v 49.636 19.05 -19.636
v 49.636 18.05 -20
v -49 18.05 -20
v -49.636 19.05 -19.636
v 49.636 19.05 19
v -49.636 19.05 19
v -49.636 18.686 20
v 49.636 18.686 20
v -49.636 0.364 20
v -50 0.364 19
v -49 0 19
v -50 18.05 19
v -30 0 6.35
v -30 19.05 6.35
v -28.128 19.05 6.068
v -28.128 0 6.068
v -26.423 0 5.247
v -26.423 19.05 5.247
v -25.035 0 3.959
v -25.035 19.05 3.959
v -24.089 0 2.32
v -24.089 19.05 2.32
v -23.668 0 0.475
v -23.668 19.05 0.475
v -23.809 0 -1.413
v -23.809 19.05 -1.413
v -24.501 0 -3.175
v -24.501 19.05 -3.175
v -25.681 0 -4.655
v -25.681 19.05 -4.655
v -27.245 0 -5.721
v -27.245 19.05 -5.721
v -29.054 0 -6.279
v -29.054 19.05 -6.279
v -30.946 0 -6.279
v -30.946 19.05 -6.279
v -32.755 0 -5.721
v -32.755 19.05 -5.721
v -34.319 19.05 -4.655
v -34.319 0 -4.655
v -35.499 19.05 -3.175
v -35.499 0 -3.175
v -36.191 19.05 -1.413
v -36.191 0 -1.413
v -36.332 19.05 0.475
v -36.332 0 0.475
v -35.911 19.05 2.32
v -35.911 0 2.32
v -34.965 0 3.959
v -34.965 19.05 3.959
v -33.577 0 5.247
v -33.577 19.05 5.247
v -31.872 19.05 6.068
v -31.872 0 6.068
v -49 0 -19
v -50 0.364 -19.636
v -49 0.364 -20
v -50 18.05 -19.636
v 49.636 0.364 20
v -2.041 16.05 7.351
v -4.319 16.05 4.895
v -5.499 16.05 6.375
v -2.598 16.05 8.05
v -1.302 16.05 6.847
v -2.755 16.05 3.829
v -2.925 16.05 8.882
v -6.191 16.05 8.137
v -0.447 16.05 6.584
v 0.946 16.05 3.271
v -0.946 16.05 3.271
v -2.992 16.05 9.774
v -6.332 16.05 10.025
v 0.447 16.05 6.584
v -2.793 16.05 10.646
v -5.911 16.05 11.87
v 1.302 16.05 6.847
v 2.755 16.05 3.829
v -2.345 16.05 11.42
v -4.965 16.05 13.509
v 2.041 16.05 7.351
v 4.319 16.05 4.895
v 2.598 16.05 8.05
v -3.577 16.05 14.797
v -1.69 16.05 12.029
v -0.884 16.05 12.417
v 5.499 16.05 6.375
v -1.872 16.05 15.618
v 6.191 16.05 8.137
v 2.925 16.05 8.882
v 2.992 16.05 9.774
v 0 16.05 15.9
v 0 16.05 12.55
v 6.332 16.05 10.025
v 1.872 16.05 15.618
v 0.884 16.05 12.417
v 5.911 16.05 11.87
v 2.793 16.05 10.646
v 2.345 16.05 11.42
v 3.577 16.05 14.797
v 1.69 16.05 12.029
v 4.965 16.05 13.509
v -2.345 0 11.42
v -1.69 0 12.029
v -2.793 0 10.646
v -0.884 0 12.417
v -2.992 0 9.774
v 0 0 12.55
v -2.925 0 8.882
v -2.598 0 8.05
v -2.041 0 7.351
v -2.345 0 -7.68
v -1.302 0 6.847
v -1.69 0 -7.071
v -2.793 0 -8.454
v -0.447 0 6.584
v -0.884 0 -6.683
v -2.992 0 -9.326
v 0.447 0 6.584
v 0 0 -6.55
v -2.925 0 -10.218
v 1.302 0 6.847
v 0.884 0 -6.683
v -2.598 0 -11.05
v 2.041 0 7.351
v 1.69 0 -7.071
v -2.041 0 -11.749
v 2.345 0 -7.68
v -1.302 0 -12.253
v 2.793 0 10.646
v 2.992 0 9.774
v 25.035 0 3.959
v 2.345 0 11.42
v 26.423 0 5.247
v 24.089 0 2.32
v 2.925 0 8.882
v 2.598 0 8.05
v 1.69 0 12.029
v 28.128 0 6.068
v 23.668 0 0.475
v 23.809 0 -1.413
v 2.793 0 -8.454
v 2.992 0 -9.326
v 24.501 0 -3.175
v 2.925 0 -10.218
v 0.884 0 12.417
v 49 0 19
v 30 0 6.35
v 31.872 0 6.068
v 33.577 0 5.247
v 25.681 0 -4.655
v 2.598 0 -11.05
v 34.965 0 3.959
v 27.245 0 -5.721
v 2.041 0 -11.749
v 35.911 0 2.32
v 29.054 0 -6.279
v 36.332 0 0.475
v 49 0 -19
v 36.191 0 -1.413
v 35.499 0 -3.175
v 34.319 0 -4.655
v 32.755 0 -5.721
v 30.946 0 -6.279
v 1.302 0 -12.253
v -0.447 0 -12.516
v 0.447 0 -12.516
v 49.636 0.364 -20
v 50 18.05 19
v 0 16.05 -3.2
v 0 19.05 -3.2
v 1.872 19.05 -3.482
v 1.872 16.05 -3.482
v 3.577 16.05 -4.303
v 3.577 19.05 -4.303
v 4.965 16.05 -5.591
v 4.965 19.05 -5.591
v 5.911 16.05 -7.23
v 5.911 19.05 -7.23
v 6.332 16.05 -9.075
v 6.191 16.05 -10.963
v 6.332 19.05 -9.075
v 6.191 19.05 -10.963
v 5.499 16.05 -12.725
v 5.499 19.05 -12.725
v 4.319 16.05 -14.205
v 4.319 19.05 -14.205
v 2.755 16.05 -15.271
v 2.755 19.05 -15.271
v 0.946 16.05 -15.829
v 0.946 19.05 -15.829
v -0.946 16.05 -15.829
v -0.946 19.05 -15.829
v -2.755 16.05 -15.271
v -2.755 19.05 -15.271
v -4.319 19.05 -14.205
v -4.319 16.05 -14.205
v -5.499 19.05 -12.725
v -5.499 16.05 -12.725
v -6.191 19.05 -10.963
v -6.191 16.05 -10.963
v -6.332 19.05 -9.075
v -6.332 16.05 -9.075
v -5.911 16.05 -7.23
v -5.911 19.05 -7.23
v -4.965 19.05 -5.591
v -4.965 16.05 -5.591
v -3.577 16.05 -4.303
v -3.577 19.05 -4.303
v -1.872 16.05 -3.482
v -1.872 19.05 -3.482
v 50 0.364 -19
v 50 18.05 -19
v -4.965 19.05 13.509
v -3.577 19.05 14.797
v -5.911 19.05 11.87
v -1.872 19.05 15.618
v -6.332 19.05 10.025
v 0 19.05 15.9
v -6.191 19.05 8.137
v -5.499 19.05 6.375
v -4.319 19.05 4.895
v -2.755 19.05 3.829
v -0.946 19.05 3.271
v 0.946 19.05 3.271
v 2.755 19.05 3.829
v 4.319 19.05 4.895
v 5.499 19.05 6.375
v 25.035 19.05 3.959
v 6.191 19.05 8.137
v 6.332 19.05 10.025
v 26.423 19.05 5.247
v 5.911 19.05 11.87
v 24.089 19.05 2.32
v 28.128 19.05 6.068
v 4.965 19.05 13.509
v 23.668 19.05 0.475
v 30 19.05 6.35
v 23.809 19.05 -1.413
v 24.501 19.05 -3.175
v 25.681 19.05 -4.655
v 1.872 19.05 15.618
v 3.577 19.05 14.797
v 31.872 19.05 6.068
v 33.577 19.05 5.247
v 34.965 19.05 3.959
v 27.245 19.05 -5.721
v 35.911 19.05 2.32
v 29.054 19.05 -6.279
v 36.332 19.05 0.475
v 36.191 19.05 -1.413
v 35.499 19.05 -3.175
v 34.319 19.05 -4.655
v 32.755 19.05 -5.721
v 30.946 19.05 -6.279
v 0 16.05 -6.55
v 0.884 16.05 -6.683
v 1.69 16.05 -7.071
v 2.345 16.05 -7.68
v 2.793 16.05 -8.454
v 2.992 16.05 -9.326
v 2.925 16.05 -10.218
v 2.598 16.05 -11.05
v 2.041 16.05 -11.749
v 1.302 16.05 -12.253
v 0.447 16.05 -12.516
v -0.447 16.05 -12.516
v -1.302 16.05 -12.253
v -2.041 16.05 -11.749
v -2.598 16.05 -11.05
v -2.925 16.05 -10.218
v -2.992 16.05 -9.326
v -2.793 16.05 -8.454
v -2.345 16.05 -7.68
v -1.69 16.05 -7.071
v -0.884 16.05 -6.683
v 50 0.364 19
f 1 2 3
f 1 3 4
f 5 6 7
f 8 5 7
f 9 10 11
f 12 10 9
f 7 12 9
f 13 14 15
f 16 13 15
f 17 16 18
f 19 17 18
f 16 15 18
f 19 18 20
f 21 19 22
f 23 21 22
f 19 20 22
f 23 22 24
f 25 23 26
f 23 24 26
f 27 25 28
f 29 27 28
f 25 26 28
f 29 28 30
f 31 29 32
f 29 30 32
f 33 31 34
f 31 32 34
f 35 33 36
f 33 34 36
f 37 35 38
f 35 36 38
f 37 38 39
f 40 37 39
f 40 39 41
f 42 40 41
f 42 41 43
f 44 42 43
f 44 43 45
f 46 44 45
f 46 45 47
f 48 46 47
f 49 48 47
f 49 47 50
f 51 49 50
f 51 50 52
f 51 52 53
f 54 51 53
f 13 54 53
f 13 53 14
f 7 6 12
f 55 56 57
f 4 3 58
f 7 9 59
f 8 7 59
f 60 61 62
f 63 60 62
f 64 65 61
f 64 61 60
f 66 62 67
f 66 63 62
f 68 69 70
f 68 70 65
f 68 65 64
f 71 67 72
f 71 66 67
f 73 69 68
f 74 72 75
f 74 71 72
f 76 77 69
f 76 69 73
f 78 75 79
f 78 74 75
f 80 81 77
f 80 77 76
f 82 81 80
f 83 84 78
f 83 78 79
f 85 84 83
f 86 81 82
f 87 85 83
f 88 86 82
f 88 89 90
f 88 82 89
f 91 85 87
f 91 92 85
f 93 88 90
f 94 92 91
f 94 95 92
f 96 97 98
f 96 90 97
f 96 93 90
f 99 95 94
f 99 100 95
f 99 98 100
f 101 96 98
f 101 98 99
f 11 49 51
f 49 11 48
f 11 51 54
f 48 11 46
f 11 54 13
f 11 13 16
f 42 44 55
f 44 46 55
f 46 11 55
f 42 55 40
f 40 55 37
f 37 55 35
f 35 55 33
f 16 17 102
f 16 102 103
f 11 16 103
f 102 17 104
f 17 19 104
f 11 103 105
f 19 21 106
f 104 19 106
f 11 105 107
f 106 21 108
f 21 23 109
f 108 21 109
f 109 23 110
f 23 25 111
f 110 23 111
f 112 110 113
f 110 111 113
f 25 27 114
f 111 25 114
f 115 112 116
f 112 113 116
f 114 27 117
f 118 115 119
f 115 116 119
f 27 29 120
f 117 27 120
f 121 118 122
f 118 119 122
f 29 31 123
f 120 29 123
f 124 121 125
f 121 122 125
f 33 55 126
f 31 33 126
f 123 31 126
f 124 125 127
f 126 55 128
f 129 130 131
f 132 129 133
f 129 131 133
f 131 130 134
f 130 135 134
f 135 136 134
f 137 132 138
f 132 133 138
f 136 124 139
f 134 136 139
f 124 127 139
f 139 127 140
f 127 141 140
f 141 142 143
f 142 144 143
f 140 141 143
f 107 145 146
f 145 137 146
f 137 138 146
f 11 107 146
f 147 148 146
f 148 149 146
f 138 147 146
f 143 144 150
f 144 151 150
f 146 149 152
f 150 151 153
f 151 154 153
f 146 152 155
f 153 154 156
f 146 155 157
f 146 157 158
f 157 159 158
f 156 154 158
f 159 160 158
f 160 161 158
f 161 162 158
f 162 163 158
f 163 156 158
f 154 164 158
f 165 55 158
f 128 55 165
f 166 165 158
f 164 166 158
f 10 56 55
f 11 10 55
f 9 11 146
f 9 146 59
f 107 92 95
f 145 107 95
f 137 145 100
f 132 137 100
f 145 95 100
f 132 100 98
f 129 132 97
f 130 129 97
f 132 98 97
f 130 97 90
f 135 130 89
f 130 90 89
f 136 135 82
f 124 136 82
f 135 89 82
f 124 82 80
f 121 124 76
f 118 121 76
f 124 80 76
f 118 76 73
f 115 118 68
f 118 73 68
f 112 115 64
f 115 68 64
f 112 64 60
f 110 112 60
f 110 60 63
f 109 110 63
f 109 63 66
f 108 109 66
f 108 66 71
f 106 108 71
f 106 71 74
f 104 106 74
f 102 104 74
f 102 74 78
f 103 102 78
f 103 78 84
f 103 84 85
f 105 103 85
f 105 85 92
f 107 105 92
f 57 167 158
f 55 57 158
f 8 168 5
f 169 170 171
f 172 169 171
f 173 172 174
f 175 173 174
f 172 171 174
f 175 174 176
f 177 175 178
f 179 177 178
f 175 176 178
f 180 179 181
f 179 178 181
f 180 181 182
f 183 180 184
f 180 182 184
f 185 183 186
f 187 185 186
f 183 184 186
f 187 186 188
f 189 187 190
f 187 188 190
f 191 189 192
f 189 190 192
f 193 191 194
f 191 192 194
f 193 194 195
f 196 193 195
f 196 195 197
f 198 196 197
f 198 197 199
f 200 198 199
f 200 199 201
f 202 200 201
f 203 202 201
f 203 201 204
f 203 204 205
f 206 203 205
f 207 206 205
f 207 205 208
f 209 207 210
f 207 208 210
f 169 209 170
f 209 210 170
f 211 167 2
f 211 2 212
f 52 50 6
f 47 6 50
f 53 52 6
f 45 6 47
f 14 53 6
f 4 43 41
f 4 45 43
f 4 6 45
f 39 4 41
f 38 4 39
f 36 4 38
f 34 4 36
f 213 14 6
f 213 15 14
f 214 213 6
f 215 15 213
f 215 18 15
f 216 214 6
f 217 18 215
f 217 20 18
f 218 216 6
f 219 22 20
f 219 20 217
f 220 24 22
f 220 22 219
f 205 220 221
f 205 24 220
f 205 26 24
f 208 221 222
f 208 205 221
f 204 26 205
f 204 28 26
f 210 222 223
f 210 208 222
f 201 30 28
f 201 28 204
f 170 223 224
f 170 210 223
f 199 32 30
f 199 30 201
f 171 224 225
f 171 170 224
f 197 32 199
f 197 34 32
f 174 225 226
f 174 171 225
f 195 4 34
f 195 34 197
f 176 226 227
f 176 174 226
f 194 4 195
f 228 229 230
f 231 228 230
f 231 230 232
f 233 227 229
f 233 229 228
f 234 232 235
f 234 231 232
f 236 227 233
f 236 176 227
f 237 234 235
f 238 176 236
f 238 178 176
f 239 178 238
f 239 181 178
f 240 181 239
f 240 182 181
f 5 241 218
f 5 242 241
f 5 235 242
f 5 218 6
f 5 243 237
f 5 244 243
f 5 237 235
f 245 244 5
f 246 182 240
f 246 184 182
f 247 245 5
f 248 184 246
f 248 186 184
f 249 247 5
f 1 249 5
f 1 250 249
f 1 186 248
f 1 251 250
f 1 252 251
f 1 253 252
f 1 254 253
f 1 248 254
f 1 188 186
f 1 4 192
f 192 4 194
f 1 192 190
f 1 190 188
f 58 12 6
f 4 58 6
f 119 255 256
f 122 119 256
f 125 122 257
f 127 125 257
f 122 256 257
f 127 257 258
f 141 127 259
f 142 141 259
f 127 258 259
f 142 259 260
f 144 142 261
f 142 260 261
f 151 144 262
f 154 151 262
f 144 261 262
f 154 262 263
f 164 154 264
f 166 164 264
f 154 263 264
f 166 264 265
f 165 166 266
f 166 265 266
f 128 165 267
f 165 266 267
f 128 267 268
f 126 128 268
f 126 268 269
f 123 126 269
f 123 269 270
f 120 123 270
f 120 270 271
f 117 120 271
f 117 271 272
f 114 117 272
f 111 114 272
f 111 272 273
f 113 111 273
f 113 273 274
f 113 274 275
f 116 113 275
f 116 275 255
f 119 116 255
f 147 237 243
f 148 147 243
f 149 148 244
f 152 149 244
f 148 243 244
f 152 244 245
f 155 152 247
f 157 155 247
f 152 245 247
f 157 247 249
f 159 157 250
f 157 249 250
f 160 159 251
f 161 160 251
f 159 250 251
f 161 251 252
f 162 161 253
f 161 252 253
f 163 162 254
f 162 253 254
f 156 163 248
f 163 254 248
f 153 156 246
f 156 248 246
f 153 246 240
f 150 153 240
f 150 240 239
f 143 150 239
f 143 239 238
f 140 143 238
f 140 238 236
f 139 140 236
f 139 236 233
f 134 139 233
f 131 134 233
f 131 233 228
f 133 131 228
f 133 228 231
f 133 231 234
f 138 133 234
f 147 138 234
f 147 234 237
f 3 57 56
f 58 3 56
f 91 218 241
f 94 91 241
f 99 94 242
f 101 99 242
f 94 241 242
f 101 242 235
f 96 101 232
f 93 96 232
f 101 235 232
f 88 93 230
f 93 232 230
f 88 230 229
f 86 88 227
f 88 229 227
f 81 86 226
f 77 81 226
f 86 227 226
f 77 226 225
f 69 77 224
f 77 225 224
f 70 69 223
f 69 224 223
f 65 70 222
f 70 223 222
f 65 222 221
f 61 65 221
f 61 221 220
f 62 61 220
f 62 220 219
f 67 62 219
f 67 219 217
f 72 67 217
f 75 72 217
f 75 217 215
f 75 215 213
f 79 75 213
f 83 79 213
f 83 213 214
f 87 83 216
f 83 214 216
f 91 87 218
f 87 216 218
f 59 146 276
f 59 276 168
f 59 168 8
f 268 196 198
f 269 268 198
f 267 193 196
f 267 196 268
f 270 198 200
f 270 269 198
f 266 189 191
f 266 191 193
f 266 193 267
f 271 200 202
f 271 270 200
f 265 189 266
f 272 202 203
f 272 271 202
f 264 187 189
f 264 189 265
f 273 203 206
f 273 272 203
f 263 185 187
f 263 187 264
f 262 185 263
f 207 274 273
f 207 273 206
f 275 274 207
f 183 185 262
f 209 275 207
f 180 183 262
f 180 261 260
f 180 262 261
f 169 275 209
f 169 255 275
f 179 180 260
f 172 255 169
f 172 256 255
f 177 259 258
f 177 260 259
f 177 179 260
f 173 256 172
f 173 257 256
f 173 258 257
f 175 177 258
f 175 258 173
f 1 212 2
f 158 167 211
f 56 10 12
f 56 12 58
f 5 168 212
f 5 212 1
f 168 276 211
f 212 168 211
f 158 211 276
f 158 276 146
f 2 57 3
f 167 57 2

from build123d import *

# Parameters (mm, degrees)
SKETCH3_W           = 100
SKETCH3_H           = 40
BOSS_EXTRUDE1_DEPTH = 19.05
SKETCH4_R           = 3
SKETCH4_R_2         = 6.35
CUT_EXTRUDE1_DEPTH  = 58.121821575
SKETCH5_R           = 6.35
CUT_EXTRUDE2_DEPTH  = 3


with BuildPart() as part:
    # Sketch3 → Boss-Extrude1 (new body)
    with BuildSketch(Plane(origin=(0, 0, 0), x_dir=(1, 0, 0), z_dir=(0, 1, 0))):
        Rectangle(SKETCH3_W, SKETCH3_H)
    extrude(amount=BOSS_EXTRUDE1_DEPTH)

    # Sketch4 → Cut-Extrude1 (cut, through all)
    with BuildSketch(Plane(origin=(0, 19.05, 0), x_dir=(1, 0, 0), z_dir=(0, 1, 0))):
        with Locations(Location((0, 9.55, 0), (0, 0, 270))):
            Circle(SKETCH4_R)
        with Locations(Location((0, -9.55, 0), (0, 0, 270))):
            Circle(SKETCH4_R)
        with Locations(Location((-30, 0, 0), (0, 0, 270))):
            Circle(SKETCH4_R_2)
        with Locations(Location((30, 0, 0), (0, 0, 270))):
            Circle(SKETCH4_R_2)
    extrude(amount=-CUT_EXTRUDE1_DEPTH, mode=Mode.SUBTRACT)

    # Sketch5 → Cut-Extrude2 (cut)
    with BuildSketch(Plane(origin=(0, 19.05, 0), x_dir=(1, 0, 0), z_dir=(0, 1, 0))):
        with Locations(Location((0, 9.55, 0), (0, 0, 270))):
            Circle(SKETCH5_R)
        with Locations(Location((0, -9.55, 0), (0, 0, 270))):
            Circle(SKETCH5_R)
    extrude(amount=-CUT_EXTRUDE2_DEPTH, mode=Mode.SUBTRACT)

    # Chamfer1
    # the kernel refuses this chamfer: 1, 0.363970234 mm, written as the material it takes off along each edge
    with BuildSketch(Plane(origin=(-49.757353177, 18.595343255, 19.333333333), x_dir=(0.34202014332567077, 0.9396926207859077, 0), z_dir=(-0.932495167133386, 0.3394004844336423, 0.12353167382937617))) as chamfer1_piece_1:
        Polygon((-0.595445134, 0.335906163), (0.468732639, 0.335906163), (0.126712495, -0.671812326), align=None)
    extrude(amount=0.509225374, mode=Mode.SUBTRACT)
    with BuildSketch(Plane(origin=(-49.545343255, 18.383333333, -19.757353177), x_dir=(-0.9396926207859077, 0, 0.34202014332567077), z_dir=(-0.3394004844336423, 0.12353167382937617, -0.932495167133386)), Plane(origin=(49.757353177, 18.595343255, 19.333333333), x_dir=(-0.34202014332567077, 0.9396926207859077, 0), z_dir=(0.932495167133386, 0.3394004844336423, 0.12353167382937617)), Plane(origin=(49.545343255, 0.242646823, -19.333333333), x_dir=(0.34202014332567077, 0, 0.9396926207859077), z_dir=(0.3394004844336414, -0.9324951671333863, -0.12353167382937585))) as chamfer1_piece_2:
        Polygon((-0.595445134, -0.335906163), (0.468732639, -0.335906163), (0.126712495, 0.671812326), align=None)
    extrude(amount=0.509225374, mode=Mode.SUBTRACT)
    with BuildSketch(Plane(origin=(-49.545343255, 0.242646823, 19.333333333), x_dir=(0.9396926207859081, -0.3420201433256699, 0), z_dir=(-0.3394004844336414, -0.9324951671333863, 0.12353167382937585))) as chamfer1_piece_3:
        Polygon((-0.468732639, -0.335906163), (0.595445134, -0.335906163), (-0.126712495, 0.671812326), align=None)
    extrude(amount=0.509225374, mode=Mode.SUBTRACT)
    with BuildSketch(Plane(origin=(49.757353177, 18.383333333, -19.545343255), x_dir=(0.34202014332567077, 0, 0.9396926207859077), z_dir=(0.932495167133386, 0.12353167382937617, -0.3394004844336423)), Plane(origin=(49.545343255, 0.242646823, 19.333333333), x_dir=(-0.9396926207859081, -0.3420201433256699, 0), z_dir=(0.3394004844336414, -0.9324951671333863, 0.12353167382937585)), Plane(origin=(-49.333333333, 0.242646823, -19.545343255), x_dir=(-0.9396926207859077, 0, 0.34202014332567077), z_dir=(-0.12353167382937585, -0.9324951671333863, -0.3394004844336414))) as chamfer1_piece_4:
        Polygon((-0.468732639, 0.335906163), (0.595445134, 0.335906163), (-0.126712495, -0.671812326), align=None)
    extrude(amount=0.509225374, mode=Mode.SUBTRACT)
    with BuildSketch(Plane(origin=(-50, 19.05, 22.594194733), x_dir=(-0.013184058198643421, -0.9999130865277317, 0), z_dir=(0, 0, -1)), Plane(origin=(50, 19.05, -22.594194733), x_dir=(0.013184058198643421, -0.9999130865277317, 0), z_dir=(0, 0, 1))) as chamfer1_piece_5:
        with BuildLine():
            Line((1.037677893, 0), (-0.042563411, -0.377122659))
            Line((-0.042563411, -0.377122659), (-0.062561673, -0.376858977))
            ThreePointArc((-0.062561673, -0.376858977), (-0.022487748, -0.188545427), (-0.019998262, 0.000263681))
            Line((-0.019998262, 0.000263681), (0.000263681, 0.019998262))
            ThreePointArc((0.000263681, 0.019998262), (0.519012443, 0.013158453), (1.037941574, 0.019998262))
            Line((1.037941574, 0.019998262), (1.037677893, 0))
        make_face()
    extrude(amount=45.188389465, mode=Mode.SUBTRACT)
    with BuildSketch(Plane(origin=(-50, -2.594194733, 20), x_dir=(-0.013184058198643421, 0, -0.9999130865277317), z_dir=(0, 1, 0)), Plane(origin=(-50, -2.594194733, -20), x_dir=(0.9999130865277315, 0, -0.013184058198646842), z_dir=(0, 1, 0))) as chamfer1_piece_6:
        with BuildLine():
            Line((1.037677893, 0), (-0.042563411, -0.377122659))
            Line((-0.042563411, -0.377122659), (-0.062561673, -0.376858977))
            ThreePointArc((-0.062561673, -0.376858977), (-0.022487748, -0.188545427), (-0.019998262, 0.000263681))
            Line((-0.019998262, 0.000263681), (0.000263681, 0.019998262))
            ThreePointArc((0.000263681, 0.019998262), (0.519012443, 0.013158453), (1.037941574, 0.019998262))
            Line((1.037941574, 0.019998262), (1.037677893, 0))
        make_face()
    extrude(amount=24.238389465, mode=Mode.SUBTRACT)
    with BuildSketch(Plane(origin=(52.594194733, 19.05, 20), x_dir=(0, 0.013184058198646846, -0.9999130865277317), z_dir=(-1, 0, 0))) as chamfer1_piece_7:
        with BuildLine():
            Line((1.037677893, 0), (-0.042563411, 0.377122659))
            Line((-0.042563411, 0.377122659), (-0.062561673, 0.376858977))
            ThreePointArc((-0.062561673, 0.376858977), (-0.022487748, 0.188545427), (-0.019998262, -0.000263681))
            Line((-0.019998262, -0.000263681), (0.000263681, -0.019998262))
            ThreePointArc((0.000263681, -0.019998262), (0.519012443, -0.013158453), (1.037941574, -0.019998262))
            Line((1.037941574, -0.019998262), (1.037677893, 0))
        make_face()
    extrude(amount=105.188389465, mode=Mode.SUBTRACT)
    with BuildSketch(Plane(origin=(50, -2.594194733, 20), x_dir=(0.013184058198643421, 0, -0.9999130865277317), z_dir=(0, 1, 0))) as chamfer1_piece_8:
        with BuildLine():
            Line((1.037677893, 0), (-0.042563411, 0.377122659))
            Line((-0.042563411, 0.377122659), (-0.062561673, 0.376858977))
            ThreePointArc((-0.062561673, 0.376858977), (-0.022487748, 0.188545427), (-0.019998262, -0.000263681))
            Line((-0.019998262, -0.000263681), (0.000263681, -0.019998262))
            ThreePointArc((0.000263681, -0.019998262), (0.519012443, -0.013158453), (1.037941574, -0.019998262))
            Line((1.037941574, -0.019998262), (1.037677893, 0))
        make_face()
    extrude(amount=24.238389465, mode=Mode.SUBTRACT)
    with BuildSketch(Plane(origin=(50, -2.594194733, -20), x_dir=(-0.9950833631817483, 0, -0.09904090225205378), z_dir=(0, 1, 0))) as chamfer1_piece_9:
        with BuildLine():
            Line((0.379516987, 0), (-0.116377165, 1.031131304))
            Line((-0.116377165, 1.031131304), (-0.136278832, 1.029150486))
            ThreePointArc((-0.136278832, 1.029150486), (-0.071283478, 0.514262313), (-0.019901667, -0.001980818))
            Line((-0.019901667, -0.001980818), (0.001980818, -0.019901667))
            ThreePointArc((0.001980818, -0.019901667), (0.189877952, -0.001200217), (0.381497805, -0.019901667))
            Line((0.381497805, -0.019901667), (0.379516987, 0))
        make_face()
    extrude(amount=24.238389465, mode=Mode.SUBTRACT)
    with BuildSketch(Plane(origin=(52.594194733, 0, 20), x_dir=(0, -0.013184058198645909, -0.9999130865277317), z_dir=(-1, 0, 0)), Plane(origin=(-52.594194733, 19.05, -20), x_dir=(0, -0.9999130865277315, -0.013184058198646842), z_dir=(1, 0, 0))) as chamfer1_piece_10:
        with BuildLine():
            Line((1.037677893, 0), (-0.042563411, -0.377122659))
            Line((-0.042563411, -0.377122659), (-0.062561673, -0.376858977))
            ThreePointArc((-0.062561673, -0.376858977), (-0.022487748, -0.188545427), (-0.019998262, 0.000263681))
            Line((-0.019998262, 0.000263681), (0.000263681, 0.019998262))
            ThreePointArc((0.000263681, 0.019998262), (0.519012443, 0.013158453), (1.037941574, 0.019998262))
            Line((1.037941574, 0.019998262), (1.037677893, 0))
        make_face()
    extrude(amount=105.188389465, mode=Mode.SUBTRACT)
    with BuildSketch(Plane(origin=(-50, 0, 22.594194733), x_dir=(-0.0990409022520534, 0.9950833631817484, 0), z_dir=(0, 0, -1)), Plane(origin=(50, 0, -22.594194733), x_dir=(0.0990409022520534, 0.9950833631817484, 0), z_dir=(0, 0, 1))) as chamfer1_piece_11:
        with BuildLine():
            Line((0.379516987, 0), (-0.116377165, 1.031131304))
            Line((-0.116377165, 1.031131304), (-0.136278832, 1.029150486))
            ThreePointArc((-0.136278832, 1.029150486), (-0.071283478, 0.514262313), (-0.019901667, -0.001980818))
            Line((-0.019901667, -0.001980818), (0.001980818, -0.019901667))
            ThreePointArc((0.001980818, -0.019901667), (0.189877952, -0.001200217), (0.381497805, -0.019901667))
            Line((0.381497805, -0.019901667), (0.379516987, 0))
        make_face()
    extrude(amount=45.188389465, mode=Mode.SUBTRACT)
    with BuildSketch(Plane(origin=(-52.594194733, 0, -20), x_dir=(0, 0.9950833631817482, -0.09904090225205339), z_dir=(1, 0, 0))) as chamfer1_piece_12:
        with BuildLine():
            Line((0.379516987, 0), (-0.116377165, 1.031131304))
            Line((-0.116377165, 1.031131304), (-0.136278832, 1.029150486))
            ThreePointArc((-0.136278832, 1.029150486), (-0.071283478, 0.514262313), (-0.019901667, -0.001980818))
            Line((-0.019901667, -0.001980818), (0.001980818, -0.019901667))
            ThreePointArc((0.001980818, -0.019901667), (0.189877952, -0.001200217), (0.381497805, -0.019901667))
            Line((0.381497805, -0.019901667), (0.379516987, 0))
        make_face()
    extrude(amount=105.188389465, mode=Mode.SUBTRACT)


solid = part.part
